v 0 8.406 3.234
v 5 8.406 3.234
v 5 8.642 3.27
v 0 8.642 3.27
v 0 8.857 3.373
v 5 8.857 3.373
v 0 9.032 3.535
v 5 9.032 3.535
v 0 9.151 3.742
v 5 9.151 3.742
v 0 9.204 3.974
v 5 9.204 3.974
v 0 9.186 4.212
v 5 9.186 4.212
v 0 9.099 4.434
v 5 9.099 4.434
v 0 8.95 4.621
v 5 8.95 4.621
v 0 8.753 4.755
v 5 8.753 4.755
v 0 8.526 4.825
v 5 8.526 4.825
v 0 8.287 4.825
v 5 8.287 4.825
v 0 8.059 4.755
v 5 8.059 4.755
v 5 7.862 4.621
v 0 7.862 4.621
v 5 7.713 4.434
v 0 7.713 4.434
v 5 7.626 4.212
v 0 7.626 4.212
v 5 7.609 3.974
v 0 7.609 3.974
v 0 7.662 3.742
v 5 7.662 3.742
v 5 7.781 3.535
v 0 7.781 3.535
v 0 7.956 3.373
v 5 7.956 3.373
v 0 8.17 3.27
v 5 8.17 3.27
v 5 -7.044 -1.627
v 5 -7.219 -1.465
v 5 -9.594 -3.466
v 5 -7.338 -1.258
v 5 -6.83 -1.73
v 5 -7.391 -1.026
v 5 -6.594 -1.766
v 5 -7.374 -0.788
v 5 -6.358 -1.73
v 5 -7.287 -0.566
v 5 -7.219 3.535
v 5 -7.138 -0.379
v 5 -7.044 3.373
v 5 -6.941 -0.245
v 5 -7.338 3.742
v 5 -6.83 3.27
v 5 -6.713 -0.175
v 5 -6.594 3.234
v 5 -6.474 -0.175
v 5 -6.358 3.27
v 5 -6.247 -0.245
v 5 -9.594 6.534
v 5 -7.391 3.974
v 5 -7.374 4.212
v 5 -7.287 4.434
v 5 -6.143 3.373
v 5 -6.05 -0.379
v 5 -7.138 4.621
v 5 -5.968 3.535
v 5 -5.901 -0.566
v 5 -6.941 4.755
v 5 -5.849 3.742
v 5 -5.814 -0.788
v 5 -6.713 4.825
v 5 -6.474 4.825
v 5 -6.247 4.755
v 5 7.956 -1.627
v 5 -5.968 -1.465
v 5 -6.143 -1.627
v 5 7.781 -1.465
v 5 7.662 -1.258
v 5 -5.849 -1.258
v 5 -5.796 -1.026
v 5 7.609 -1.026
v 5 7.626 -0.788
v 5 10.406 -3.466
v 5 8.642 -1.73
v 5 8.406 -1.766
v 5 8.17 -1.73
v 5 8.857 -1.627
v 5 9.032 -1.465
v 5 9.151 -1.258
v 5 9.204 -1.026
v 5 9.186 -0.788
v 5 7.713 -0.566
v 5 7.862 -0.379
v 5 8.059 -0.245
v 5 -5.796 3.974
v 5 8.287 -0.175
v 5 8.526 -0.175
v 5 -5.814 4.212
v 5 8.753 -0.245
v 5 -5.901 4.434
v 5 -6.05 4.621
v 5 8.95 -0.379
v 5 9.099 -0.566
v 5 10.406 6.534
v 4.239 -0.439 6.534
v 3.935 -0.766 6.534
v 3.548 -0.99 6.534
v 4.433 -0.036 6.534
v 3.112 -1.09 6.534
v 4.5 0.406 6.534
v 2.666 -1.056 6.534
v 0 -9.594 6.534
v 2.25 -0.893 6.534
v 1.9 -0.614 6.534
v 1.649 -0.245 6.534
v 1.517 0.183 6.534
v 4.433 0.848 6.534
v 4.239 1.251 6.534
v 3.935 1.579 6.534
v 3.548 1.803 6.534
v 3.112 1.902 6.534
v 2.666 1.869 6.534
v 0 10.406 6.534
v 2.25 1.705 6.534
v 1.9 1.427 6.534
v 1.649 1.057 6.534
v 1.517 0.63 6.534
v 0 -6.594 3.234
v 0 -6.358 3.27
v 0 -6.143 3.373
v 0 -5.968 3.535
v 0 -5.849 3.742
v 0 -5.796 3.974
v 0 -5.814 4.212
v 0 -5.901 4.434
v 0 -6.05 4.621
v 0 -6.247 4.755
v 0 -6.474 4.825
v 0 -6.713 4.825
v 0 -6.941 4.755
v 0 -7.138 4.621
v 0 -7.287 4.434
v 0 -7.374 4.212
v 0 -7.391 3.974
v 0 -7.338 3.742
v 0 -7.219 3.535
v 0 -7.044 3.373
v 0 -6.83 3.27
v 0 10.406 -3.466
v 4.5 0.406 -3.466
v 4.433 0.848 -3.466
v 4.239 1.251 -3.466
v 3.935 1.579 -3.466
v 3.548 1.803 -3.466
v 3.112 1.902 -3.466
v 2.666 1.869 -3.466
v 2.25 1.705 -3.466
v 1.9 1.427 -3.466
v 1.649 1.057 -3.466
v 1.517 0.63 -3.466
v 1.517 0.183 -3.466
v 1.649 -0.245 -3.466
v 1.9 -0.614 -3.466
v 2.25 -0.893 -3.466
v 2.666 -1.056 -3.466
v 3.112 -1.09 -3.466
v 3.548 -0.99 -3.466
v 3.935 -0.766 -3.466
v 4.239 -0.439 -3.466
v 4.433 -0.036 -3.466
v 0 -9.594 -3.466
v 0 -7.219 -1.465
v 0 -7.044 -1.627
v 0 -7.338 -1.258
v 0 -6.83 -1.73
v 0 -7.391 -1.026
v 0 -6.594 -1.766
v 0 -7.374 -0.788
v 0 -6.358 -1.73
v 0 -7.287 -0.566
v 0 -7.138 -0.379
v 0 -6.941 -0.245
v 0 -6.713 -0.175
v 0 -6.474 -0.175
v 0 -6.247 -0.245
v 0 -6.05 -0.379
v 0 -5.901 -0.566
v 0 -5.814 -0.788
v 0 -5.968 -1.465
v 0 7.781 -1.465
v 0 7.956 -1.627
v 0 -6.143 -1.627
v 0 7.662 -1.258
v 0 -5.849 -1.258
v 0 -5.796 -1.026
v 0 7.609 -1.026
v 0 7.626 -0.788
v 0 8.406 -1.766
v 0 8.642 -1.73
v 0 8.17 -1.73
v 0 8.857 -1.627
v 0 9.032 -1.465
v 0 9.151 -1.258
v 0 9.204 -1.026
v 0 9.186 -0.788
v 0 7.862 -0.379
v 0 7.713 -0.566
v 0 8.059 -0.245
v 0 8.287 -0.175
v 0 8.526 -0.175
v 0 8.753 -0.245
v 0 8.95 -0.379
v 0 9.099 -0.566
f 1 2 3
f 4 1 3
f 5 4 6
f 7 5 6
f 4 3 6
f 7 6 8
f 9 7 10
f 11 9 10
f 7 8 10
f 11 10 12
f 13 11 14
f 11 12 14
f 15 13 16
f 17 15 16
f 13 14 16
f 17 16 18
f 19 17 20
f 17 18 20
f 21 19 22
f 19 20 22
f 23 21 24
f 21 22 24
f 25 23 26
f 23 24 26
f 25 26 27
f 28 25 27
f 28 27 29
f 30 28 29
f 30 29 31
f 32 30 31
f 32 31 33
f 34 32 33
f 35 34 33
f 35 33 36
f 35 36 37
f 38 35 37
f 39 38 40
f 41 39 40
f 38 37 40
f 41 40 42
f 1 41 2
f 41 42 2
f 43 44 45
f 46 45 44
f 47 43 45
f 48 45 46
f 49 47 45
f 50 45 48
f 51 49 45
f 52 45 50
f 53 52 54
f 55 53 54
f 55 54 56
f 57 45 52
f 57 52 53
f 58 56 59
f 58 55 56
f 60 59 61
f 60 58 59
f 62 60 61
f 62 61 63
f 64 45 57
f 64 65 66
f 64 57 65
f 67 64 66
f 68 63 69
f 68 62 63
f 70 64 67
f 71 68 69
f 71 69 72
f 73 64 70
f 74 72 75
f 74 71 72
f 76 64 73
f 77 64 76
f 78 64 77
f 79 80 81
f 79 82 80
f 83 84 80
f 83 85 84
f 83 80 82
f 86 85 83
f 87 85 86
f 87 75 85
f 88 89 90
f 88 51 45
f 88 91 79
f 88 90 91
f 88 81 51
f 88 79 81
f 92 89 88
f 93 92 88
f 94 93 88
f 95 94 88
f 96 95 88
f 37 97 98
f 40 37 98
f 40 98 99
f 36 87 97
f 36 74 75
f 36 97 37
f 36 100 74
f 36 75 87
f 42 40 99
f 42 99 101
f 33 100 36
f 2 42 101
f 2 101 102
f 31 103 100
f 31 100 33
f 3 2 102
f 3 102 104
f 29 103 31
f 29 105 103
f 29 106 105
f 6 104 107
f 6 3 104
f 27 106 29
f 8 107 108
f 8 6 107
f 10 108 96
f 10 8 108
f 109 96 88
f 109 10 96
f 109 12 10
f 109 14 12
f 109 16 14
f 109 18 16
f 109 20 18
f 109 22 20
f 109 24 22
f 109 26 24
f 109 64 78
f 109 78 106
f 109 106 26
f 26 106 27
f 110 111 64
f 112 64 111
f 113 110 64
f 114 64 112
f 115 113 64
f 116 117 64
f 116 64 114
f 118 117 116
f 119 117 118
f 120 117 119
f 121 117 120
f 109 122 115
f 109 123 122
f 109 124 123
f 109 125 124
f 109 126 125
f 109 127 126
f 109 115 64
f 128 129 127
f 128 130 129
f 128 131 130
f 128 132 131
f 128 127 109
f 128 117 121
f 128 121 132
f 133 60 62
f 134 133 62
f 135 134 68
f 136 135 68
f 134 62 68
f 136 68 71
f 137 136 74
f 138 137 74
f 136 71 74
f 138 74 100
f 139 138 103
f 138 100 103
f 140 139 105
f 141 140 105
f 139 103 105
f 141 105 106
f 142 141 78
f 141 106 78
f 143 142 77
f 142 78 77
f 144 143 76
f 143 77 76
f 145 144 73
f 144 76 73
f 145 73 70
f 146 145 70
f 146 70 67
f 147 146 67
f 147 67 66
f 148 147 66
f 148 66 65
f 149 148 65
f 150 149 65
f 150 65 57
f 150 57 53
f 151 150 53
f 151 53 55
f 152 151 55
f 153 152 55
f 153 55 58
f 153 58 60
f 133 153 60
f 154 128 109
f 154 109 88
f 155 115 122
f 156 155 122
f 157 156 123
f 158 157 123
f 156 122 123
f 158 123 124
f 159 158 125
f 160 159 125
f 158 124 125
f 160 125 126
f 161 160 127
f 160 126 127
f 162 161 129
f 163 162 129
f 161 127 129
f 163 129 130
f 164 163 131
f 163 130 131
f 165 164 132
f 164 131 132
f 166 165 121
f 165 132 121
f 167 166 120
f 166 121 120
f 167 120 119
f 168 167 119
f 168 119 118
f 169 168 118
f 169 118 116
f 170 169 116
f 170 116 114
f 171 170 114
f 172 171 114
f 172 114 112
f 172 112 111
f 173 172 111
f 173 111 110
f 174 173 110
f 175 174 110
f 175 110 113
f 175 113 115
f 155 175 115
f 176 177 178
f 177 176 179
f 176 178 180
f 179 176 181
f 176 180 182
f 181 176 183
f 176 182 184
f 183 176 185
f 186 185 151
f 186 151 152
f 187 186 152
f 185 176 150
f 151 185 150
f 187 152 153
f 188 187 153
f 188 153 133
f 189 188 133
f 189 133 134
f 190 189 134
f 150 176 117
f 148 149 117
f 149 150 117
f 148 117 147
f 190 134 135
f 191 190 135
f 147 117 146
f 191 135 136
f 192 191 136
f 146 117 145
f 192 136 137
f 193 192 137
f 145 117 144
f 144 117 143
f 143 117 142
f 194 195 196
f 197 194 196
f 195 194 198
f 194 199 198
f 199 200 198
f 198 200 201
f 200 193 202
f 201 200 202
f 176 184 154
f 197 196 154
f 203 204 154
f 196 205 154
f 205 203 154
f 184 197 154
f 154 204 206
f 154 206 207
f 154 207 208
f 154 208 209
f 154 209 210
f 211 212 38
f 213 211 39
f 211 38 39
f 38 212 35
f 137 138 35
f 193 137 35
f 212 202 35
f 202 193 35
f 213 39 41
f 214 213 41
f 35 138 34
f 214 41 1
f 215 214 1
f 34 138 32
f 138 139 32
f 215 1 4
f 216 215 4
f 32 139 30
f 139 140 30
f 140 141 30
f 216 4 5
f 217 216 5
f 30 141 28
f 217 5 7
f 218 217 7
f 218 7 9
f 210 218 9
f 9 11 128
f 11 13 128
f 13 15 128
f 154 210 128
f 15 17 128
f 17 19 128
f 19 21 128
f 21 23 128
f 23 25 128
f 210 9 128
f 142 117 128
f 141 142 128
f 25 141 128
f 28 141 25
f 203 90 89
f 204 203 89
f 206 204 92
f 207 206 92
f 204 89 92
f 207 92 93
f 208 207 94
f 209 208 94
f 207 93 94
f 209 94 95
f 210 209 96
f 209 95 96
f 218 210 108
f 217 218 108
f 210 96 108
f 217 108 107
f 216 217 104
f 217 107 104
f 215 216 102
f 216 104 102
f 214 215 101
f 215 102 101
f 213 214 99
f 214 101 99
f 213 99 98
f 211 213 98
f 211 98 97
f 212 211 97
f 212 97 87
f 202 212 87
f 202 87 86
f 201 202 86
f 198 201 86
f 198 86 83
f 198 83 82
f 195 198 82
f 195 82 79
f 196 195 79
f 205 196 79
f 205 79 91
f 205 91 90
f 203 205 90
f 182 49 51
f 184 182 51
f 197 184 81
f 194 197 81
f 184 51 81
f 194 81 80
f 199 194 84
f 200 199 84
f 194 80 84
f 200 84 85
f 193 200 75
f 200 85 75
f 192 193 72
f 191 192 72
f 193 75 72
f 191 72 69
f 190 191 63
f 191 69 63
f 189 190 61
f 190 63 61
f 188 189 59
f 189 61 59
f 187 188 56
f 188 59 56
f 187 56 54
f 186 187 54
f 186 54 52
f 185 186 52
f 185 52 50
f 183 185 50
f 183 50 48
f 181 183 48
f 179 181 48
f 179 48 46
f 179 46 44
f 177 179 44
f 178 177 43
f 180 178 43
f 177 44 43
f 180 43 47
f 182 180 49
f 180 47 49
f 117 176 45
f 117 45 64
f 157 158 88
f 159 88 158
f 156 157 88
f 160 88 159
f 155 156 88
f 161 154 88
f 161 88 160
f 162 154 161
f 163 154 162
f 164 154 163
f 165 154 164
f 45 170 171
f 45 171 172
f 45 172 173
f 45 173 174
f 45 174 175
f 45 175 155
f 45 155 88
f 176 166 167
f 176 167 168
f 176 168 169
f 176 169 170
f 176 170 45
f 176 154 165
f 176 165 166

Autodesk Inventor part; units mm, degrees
ref_plane "YZ Plane" through (0, 0, 0) normal (1, 0, 0) x (0, 1, 0)
ref_plane "XZ Plane" through (0, 0, 0) normal (0, 1, 0) x (-1, 0, 0)
ref_plane "XY Plane" through (0, 0, 0) normal (0, 0, 1) x (1, 0, 0)
sketch "Sketch1" plane through (0, 0, 0) normal (1, 0, 0) x (0, 1, 0)
  line L0 (-9.5937, 6.5342) -> (10.4063, 6.5342)
  line L1 (10.4063, 6.5342) -> (10.4063, -3.4658)
  line L2 (10.4063, -3.4658) -> (-9.5937, -3.4658)
  line L3 (-9.5937, -3.4658) -> (-9.5937, 6.5342)
  point P0 (0, 0)
  dimension "d0" = 20
  dimension "d1" = 10
extrude "Extrusion1" add sketch "Sketch1" along normal blind 5
sketch "Sketch2" plane through (0, -9.5937, 6.5342) normal (0, 0, 1) x (1, 0, 0)
  circle A0 centre (3, 10) radius 1.5
  line L0 (5, 20) -> (5, 0) projected
  line L1 (0, 20) -> (5, 20) projected
  point P0 (0, 9.5937)
  dimension "d4" = 3
  dimension "d5" = 2
  dimension "d6" = 10
extrude "Extrusion2" cut sketch "Sketch2" against normal through all
sketch "Sketch3" plane through (5, 0, 0) normal (1, 0, 0) x (0, 0, -1)
  circle A0 centre (-4.0342, -6.5937) radius 0.8
  circle A1 centre (0.9658, -6.5937) radius 0.8
  circle A2 centre (-4.0342, 8.4063) radius 0.8
  circle A3 centre (0.9658, 8.4063) radius 0.8
  line L0 (-6.5342, 10.4063) -> (-6.5342, -9.5937) projected
  line L1 (3.4658, -9.5937) -> (3.4658, 10.4063) projected
  line L2 (-6.5342, -9.5937) -> (3.4658, -9.5937) projected
  point P0 (0, 0)
  dimension "d9" = 1.6
  dimension "d11" = 1.6
  dimension "d12" = 1.6
  dimension "d13" = 1.6
  dimension "d14" = 2.5
  dimension "d15" = 2.5
  dimension "d16" = 3
  dimension "d17" = 3
  dimension "d18" = 15
  dimension "d19" = 15
  dimension "d20" = 2.5
  dimension "d21" = 2.5
extrude "Extrusion3" cut sketch "Sketch3" against normal through all
properties part number "z_shaft_block"
